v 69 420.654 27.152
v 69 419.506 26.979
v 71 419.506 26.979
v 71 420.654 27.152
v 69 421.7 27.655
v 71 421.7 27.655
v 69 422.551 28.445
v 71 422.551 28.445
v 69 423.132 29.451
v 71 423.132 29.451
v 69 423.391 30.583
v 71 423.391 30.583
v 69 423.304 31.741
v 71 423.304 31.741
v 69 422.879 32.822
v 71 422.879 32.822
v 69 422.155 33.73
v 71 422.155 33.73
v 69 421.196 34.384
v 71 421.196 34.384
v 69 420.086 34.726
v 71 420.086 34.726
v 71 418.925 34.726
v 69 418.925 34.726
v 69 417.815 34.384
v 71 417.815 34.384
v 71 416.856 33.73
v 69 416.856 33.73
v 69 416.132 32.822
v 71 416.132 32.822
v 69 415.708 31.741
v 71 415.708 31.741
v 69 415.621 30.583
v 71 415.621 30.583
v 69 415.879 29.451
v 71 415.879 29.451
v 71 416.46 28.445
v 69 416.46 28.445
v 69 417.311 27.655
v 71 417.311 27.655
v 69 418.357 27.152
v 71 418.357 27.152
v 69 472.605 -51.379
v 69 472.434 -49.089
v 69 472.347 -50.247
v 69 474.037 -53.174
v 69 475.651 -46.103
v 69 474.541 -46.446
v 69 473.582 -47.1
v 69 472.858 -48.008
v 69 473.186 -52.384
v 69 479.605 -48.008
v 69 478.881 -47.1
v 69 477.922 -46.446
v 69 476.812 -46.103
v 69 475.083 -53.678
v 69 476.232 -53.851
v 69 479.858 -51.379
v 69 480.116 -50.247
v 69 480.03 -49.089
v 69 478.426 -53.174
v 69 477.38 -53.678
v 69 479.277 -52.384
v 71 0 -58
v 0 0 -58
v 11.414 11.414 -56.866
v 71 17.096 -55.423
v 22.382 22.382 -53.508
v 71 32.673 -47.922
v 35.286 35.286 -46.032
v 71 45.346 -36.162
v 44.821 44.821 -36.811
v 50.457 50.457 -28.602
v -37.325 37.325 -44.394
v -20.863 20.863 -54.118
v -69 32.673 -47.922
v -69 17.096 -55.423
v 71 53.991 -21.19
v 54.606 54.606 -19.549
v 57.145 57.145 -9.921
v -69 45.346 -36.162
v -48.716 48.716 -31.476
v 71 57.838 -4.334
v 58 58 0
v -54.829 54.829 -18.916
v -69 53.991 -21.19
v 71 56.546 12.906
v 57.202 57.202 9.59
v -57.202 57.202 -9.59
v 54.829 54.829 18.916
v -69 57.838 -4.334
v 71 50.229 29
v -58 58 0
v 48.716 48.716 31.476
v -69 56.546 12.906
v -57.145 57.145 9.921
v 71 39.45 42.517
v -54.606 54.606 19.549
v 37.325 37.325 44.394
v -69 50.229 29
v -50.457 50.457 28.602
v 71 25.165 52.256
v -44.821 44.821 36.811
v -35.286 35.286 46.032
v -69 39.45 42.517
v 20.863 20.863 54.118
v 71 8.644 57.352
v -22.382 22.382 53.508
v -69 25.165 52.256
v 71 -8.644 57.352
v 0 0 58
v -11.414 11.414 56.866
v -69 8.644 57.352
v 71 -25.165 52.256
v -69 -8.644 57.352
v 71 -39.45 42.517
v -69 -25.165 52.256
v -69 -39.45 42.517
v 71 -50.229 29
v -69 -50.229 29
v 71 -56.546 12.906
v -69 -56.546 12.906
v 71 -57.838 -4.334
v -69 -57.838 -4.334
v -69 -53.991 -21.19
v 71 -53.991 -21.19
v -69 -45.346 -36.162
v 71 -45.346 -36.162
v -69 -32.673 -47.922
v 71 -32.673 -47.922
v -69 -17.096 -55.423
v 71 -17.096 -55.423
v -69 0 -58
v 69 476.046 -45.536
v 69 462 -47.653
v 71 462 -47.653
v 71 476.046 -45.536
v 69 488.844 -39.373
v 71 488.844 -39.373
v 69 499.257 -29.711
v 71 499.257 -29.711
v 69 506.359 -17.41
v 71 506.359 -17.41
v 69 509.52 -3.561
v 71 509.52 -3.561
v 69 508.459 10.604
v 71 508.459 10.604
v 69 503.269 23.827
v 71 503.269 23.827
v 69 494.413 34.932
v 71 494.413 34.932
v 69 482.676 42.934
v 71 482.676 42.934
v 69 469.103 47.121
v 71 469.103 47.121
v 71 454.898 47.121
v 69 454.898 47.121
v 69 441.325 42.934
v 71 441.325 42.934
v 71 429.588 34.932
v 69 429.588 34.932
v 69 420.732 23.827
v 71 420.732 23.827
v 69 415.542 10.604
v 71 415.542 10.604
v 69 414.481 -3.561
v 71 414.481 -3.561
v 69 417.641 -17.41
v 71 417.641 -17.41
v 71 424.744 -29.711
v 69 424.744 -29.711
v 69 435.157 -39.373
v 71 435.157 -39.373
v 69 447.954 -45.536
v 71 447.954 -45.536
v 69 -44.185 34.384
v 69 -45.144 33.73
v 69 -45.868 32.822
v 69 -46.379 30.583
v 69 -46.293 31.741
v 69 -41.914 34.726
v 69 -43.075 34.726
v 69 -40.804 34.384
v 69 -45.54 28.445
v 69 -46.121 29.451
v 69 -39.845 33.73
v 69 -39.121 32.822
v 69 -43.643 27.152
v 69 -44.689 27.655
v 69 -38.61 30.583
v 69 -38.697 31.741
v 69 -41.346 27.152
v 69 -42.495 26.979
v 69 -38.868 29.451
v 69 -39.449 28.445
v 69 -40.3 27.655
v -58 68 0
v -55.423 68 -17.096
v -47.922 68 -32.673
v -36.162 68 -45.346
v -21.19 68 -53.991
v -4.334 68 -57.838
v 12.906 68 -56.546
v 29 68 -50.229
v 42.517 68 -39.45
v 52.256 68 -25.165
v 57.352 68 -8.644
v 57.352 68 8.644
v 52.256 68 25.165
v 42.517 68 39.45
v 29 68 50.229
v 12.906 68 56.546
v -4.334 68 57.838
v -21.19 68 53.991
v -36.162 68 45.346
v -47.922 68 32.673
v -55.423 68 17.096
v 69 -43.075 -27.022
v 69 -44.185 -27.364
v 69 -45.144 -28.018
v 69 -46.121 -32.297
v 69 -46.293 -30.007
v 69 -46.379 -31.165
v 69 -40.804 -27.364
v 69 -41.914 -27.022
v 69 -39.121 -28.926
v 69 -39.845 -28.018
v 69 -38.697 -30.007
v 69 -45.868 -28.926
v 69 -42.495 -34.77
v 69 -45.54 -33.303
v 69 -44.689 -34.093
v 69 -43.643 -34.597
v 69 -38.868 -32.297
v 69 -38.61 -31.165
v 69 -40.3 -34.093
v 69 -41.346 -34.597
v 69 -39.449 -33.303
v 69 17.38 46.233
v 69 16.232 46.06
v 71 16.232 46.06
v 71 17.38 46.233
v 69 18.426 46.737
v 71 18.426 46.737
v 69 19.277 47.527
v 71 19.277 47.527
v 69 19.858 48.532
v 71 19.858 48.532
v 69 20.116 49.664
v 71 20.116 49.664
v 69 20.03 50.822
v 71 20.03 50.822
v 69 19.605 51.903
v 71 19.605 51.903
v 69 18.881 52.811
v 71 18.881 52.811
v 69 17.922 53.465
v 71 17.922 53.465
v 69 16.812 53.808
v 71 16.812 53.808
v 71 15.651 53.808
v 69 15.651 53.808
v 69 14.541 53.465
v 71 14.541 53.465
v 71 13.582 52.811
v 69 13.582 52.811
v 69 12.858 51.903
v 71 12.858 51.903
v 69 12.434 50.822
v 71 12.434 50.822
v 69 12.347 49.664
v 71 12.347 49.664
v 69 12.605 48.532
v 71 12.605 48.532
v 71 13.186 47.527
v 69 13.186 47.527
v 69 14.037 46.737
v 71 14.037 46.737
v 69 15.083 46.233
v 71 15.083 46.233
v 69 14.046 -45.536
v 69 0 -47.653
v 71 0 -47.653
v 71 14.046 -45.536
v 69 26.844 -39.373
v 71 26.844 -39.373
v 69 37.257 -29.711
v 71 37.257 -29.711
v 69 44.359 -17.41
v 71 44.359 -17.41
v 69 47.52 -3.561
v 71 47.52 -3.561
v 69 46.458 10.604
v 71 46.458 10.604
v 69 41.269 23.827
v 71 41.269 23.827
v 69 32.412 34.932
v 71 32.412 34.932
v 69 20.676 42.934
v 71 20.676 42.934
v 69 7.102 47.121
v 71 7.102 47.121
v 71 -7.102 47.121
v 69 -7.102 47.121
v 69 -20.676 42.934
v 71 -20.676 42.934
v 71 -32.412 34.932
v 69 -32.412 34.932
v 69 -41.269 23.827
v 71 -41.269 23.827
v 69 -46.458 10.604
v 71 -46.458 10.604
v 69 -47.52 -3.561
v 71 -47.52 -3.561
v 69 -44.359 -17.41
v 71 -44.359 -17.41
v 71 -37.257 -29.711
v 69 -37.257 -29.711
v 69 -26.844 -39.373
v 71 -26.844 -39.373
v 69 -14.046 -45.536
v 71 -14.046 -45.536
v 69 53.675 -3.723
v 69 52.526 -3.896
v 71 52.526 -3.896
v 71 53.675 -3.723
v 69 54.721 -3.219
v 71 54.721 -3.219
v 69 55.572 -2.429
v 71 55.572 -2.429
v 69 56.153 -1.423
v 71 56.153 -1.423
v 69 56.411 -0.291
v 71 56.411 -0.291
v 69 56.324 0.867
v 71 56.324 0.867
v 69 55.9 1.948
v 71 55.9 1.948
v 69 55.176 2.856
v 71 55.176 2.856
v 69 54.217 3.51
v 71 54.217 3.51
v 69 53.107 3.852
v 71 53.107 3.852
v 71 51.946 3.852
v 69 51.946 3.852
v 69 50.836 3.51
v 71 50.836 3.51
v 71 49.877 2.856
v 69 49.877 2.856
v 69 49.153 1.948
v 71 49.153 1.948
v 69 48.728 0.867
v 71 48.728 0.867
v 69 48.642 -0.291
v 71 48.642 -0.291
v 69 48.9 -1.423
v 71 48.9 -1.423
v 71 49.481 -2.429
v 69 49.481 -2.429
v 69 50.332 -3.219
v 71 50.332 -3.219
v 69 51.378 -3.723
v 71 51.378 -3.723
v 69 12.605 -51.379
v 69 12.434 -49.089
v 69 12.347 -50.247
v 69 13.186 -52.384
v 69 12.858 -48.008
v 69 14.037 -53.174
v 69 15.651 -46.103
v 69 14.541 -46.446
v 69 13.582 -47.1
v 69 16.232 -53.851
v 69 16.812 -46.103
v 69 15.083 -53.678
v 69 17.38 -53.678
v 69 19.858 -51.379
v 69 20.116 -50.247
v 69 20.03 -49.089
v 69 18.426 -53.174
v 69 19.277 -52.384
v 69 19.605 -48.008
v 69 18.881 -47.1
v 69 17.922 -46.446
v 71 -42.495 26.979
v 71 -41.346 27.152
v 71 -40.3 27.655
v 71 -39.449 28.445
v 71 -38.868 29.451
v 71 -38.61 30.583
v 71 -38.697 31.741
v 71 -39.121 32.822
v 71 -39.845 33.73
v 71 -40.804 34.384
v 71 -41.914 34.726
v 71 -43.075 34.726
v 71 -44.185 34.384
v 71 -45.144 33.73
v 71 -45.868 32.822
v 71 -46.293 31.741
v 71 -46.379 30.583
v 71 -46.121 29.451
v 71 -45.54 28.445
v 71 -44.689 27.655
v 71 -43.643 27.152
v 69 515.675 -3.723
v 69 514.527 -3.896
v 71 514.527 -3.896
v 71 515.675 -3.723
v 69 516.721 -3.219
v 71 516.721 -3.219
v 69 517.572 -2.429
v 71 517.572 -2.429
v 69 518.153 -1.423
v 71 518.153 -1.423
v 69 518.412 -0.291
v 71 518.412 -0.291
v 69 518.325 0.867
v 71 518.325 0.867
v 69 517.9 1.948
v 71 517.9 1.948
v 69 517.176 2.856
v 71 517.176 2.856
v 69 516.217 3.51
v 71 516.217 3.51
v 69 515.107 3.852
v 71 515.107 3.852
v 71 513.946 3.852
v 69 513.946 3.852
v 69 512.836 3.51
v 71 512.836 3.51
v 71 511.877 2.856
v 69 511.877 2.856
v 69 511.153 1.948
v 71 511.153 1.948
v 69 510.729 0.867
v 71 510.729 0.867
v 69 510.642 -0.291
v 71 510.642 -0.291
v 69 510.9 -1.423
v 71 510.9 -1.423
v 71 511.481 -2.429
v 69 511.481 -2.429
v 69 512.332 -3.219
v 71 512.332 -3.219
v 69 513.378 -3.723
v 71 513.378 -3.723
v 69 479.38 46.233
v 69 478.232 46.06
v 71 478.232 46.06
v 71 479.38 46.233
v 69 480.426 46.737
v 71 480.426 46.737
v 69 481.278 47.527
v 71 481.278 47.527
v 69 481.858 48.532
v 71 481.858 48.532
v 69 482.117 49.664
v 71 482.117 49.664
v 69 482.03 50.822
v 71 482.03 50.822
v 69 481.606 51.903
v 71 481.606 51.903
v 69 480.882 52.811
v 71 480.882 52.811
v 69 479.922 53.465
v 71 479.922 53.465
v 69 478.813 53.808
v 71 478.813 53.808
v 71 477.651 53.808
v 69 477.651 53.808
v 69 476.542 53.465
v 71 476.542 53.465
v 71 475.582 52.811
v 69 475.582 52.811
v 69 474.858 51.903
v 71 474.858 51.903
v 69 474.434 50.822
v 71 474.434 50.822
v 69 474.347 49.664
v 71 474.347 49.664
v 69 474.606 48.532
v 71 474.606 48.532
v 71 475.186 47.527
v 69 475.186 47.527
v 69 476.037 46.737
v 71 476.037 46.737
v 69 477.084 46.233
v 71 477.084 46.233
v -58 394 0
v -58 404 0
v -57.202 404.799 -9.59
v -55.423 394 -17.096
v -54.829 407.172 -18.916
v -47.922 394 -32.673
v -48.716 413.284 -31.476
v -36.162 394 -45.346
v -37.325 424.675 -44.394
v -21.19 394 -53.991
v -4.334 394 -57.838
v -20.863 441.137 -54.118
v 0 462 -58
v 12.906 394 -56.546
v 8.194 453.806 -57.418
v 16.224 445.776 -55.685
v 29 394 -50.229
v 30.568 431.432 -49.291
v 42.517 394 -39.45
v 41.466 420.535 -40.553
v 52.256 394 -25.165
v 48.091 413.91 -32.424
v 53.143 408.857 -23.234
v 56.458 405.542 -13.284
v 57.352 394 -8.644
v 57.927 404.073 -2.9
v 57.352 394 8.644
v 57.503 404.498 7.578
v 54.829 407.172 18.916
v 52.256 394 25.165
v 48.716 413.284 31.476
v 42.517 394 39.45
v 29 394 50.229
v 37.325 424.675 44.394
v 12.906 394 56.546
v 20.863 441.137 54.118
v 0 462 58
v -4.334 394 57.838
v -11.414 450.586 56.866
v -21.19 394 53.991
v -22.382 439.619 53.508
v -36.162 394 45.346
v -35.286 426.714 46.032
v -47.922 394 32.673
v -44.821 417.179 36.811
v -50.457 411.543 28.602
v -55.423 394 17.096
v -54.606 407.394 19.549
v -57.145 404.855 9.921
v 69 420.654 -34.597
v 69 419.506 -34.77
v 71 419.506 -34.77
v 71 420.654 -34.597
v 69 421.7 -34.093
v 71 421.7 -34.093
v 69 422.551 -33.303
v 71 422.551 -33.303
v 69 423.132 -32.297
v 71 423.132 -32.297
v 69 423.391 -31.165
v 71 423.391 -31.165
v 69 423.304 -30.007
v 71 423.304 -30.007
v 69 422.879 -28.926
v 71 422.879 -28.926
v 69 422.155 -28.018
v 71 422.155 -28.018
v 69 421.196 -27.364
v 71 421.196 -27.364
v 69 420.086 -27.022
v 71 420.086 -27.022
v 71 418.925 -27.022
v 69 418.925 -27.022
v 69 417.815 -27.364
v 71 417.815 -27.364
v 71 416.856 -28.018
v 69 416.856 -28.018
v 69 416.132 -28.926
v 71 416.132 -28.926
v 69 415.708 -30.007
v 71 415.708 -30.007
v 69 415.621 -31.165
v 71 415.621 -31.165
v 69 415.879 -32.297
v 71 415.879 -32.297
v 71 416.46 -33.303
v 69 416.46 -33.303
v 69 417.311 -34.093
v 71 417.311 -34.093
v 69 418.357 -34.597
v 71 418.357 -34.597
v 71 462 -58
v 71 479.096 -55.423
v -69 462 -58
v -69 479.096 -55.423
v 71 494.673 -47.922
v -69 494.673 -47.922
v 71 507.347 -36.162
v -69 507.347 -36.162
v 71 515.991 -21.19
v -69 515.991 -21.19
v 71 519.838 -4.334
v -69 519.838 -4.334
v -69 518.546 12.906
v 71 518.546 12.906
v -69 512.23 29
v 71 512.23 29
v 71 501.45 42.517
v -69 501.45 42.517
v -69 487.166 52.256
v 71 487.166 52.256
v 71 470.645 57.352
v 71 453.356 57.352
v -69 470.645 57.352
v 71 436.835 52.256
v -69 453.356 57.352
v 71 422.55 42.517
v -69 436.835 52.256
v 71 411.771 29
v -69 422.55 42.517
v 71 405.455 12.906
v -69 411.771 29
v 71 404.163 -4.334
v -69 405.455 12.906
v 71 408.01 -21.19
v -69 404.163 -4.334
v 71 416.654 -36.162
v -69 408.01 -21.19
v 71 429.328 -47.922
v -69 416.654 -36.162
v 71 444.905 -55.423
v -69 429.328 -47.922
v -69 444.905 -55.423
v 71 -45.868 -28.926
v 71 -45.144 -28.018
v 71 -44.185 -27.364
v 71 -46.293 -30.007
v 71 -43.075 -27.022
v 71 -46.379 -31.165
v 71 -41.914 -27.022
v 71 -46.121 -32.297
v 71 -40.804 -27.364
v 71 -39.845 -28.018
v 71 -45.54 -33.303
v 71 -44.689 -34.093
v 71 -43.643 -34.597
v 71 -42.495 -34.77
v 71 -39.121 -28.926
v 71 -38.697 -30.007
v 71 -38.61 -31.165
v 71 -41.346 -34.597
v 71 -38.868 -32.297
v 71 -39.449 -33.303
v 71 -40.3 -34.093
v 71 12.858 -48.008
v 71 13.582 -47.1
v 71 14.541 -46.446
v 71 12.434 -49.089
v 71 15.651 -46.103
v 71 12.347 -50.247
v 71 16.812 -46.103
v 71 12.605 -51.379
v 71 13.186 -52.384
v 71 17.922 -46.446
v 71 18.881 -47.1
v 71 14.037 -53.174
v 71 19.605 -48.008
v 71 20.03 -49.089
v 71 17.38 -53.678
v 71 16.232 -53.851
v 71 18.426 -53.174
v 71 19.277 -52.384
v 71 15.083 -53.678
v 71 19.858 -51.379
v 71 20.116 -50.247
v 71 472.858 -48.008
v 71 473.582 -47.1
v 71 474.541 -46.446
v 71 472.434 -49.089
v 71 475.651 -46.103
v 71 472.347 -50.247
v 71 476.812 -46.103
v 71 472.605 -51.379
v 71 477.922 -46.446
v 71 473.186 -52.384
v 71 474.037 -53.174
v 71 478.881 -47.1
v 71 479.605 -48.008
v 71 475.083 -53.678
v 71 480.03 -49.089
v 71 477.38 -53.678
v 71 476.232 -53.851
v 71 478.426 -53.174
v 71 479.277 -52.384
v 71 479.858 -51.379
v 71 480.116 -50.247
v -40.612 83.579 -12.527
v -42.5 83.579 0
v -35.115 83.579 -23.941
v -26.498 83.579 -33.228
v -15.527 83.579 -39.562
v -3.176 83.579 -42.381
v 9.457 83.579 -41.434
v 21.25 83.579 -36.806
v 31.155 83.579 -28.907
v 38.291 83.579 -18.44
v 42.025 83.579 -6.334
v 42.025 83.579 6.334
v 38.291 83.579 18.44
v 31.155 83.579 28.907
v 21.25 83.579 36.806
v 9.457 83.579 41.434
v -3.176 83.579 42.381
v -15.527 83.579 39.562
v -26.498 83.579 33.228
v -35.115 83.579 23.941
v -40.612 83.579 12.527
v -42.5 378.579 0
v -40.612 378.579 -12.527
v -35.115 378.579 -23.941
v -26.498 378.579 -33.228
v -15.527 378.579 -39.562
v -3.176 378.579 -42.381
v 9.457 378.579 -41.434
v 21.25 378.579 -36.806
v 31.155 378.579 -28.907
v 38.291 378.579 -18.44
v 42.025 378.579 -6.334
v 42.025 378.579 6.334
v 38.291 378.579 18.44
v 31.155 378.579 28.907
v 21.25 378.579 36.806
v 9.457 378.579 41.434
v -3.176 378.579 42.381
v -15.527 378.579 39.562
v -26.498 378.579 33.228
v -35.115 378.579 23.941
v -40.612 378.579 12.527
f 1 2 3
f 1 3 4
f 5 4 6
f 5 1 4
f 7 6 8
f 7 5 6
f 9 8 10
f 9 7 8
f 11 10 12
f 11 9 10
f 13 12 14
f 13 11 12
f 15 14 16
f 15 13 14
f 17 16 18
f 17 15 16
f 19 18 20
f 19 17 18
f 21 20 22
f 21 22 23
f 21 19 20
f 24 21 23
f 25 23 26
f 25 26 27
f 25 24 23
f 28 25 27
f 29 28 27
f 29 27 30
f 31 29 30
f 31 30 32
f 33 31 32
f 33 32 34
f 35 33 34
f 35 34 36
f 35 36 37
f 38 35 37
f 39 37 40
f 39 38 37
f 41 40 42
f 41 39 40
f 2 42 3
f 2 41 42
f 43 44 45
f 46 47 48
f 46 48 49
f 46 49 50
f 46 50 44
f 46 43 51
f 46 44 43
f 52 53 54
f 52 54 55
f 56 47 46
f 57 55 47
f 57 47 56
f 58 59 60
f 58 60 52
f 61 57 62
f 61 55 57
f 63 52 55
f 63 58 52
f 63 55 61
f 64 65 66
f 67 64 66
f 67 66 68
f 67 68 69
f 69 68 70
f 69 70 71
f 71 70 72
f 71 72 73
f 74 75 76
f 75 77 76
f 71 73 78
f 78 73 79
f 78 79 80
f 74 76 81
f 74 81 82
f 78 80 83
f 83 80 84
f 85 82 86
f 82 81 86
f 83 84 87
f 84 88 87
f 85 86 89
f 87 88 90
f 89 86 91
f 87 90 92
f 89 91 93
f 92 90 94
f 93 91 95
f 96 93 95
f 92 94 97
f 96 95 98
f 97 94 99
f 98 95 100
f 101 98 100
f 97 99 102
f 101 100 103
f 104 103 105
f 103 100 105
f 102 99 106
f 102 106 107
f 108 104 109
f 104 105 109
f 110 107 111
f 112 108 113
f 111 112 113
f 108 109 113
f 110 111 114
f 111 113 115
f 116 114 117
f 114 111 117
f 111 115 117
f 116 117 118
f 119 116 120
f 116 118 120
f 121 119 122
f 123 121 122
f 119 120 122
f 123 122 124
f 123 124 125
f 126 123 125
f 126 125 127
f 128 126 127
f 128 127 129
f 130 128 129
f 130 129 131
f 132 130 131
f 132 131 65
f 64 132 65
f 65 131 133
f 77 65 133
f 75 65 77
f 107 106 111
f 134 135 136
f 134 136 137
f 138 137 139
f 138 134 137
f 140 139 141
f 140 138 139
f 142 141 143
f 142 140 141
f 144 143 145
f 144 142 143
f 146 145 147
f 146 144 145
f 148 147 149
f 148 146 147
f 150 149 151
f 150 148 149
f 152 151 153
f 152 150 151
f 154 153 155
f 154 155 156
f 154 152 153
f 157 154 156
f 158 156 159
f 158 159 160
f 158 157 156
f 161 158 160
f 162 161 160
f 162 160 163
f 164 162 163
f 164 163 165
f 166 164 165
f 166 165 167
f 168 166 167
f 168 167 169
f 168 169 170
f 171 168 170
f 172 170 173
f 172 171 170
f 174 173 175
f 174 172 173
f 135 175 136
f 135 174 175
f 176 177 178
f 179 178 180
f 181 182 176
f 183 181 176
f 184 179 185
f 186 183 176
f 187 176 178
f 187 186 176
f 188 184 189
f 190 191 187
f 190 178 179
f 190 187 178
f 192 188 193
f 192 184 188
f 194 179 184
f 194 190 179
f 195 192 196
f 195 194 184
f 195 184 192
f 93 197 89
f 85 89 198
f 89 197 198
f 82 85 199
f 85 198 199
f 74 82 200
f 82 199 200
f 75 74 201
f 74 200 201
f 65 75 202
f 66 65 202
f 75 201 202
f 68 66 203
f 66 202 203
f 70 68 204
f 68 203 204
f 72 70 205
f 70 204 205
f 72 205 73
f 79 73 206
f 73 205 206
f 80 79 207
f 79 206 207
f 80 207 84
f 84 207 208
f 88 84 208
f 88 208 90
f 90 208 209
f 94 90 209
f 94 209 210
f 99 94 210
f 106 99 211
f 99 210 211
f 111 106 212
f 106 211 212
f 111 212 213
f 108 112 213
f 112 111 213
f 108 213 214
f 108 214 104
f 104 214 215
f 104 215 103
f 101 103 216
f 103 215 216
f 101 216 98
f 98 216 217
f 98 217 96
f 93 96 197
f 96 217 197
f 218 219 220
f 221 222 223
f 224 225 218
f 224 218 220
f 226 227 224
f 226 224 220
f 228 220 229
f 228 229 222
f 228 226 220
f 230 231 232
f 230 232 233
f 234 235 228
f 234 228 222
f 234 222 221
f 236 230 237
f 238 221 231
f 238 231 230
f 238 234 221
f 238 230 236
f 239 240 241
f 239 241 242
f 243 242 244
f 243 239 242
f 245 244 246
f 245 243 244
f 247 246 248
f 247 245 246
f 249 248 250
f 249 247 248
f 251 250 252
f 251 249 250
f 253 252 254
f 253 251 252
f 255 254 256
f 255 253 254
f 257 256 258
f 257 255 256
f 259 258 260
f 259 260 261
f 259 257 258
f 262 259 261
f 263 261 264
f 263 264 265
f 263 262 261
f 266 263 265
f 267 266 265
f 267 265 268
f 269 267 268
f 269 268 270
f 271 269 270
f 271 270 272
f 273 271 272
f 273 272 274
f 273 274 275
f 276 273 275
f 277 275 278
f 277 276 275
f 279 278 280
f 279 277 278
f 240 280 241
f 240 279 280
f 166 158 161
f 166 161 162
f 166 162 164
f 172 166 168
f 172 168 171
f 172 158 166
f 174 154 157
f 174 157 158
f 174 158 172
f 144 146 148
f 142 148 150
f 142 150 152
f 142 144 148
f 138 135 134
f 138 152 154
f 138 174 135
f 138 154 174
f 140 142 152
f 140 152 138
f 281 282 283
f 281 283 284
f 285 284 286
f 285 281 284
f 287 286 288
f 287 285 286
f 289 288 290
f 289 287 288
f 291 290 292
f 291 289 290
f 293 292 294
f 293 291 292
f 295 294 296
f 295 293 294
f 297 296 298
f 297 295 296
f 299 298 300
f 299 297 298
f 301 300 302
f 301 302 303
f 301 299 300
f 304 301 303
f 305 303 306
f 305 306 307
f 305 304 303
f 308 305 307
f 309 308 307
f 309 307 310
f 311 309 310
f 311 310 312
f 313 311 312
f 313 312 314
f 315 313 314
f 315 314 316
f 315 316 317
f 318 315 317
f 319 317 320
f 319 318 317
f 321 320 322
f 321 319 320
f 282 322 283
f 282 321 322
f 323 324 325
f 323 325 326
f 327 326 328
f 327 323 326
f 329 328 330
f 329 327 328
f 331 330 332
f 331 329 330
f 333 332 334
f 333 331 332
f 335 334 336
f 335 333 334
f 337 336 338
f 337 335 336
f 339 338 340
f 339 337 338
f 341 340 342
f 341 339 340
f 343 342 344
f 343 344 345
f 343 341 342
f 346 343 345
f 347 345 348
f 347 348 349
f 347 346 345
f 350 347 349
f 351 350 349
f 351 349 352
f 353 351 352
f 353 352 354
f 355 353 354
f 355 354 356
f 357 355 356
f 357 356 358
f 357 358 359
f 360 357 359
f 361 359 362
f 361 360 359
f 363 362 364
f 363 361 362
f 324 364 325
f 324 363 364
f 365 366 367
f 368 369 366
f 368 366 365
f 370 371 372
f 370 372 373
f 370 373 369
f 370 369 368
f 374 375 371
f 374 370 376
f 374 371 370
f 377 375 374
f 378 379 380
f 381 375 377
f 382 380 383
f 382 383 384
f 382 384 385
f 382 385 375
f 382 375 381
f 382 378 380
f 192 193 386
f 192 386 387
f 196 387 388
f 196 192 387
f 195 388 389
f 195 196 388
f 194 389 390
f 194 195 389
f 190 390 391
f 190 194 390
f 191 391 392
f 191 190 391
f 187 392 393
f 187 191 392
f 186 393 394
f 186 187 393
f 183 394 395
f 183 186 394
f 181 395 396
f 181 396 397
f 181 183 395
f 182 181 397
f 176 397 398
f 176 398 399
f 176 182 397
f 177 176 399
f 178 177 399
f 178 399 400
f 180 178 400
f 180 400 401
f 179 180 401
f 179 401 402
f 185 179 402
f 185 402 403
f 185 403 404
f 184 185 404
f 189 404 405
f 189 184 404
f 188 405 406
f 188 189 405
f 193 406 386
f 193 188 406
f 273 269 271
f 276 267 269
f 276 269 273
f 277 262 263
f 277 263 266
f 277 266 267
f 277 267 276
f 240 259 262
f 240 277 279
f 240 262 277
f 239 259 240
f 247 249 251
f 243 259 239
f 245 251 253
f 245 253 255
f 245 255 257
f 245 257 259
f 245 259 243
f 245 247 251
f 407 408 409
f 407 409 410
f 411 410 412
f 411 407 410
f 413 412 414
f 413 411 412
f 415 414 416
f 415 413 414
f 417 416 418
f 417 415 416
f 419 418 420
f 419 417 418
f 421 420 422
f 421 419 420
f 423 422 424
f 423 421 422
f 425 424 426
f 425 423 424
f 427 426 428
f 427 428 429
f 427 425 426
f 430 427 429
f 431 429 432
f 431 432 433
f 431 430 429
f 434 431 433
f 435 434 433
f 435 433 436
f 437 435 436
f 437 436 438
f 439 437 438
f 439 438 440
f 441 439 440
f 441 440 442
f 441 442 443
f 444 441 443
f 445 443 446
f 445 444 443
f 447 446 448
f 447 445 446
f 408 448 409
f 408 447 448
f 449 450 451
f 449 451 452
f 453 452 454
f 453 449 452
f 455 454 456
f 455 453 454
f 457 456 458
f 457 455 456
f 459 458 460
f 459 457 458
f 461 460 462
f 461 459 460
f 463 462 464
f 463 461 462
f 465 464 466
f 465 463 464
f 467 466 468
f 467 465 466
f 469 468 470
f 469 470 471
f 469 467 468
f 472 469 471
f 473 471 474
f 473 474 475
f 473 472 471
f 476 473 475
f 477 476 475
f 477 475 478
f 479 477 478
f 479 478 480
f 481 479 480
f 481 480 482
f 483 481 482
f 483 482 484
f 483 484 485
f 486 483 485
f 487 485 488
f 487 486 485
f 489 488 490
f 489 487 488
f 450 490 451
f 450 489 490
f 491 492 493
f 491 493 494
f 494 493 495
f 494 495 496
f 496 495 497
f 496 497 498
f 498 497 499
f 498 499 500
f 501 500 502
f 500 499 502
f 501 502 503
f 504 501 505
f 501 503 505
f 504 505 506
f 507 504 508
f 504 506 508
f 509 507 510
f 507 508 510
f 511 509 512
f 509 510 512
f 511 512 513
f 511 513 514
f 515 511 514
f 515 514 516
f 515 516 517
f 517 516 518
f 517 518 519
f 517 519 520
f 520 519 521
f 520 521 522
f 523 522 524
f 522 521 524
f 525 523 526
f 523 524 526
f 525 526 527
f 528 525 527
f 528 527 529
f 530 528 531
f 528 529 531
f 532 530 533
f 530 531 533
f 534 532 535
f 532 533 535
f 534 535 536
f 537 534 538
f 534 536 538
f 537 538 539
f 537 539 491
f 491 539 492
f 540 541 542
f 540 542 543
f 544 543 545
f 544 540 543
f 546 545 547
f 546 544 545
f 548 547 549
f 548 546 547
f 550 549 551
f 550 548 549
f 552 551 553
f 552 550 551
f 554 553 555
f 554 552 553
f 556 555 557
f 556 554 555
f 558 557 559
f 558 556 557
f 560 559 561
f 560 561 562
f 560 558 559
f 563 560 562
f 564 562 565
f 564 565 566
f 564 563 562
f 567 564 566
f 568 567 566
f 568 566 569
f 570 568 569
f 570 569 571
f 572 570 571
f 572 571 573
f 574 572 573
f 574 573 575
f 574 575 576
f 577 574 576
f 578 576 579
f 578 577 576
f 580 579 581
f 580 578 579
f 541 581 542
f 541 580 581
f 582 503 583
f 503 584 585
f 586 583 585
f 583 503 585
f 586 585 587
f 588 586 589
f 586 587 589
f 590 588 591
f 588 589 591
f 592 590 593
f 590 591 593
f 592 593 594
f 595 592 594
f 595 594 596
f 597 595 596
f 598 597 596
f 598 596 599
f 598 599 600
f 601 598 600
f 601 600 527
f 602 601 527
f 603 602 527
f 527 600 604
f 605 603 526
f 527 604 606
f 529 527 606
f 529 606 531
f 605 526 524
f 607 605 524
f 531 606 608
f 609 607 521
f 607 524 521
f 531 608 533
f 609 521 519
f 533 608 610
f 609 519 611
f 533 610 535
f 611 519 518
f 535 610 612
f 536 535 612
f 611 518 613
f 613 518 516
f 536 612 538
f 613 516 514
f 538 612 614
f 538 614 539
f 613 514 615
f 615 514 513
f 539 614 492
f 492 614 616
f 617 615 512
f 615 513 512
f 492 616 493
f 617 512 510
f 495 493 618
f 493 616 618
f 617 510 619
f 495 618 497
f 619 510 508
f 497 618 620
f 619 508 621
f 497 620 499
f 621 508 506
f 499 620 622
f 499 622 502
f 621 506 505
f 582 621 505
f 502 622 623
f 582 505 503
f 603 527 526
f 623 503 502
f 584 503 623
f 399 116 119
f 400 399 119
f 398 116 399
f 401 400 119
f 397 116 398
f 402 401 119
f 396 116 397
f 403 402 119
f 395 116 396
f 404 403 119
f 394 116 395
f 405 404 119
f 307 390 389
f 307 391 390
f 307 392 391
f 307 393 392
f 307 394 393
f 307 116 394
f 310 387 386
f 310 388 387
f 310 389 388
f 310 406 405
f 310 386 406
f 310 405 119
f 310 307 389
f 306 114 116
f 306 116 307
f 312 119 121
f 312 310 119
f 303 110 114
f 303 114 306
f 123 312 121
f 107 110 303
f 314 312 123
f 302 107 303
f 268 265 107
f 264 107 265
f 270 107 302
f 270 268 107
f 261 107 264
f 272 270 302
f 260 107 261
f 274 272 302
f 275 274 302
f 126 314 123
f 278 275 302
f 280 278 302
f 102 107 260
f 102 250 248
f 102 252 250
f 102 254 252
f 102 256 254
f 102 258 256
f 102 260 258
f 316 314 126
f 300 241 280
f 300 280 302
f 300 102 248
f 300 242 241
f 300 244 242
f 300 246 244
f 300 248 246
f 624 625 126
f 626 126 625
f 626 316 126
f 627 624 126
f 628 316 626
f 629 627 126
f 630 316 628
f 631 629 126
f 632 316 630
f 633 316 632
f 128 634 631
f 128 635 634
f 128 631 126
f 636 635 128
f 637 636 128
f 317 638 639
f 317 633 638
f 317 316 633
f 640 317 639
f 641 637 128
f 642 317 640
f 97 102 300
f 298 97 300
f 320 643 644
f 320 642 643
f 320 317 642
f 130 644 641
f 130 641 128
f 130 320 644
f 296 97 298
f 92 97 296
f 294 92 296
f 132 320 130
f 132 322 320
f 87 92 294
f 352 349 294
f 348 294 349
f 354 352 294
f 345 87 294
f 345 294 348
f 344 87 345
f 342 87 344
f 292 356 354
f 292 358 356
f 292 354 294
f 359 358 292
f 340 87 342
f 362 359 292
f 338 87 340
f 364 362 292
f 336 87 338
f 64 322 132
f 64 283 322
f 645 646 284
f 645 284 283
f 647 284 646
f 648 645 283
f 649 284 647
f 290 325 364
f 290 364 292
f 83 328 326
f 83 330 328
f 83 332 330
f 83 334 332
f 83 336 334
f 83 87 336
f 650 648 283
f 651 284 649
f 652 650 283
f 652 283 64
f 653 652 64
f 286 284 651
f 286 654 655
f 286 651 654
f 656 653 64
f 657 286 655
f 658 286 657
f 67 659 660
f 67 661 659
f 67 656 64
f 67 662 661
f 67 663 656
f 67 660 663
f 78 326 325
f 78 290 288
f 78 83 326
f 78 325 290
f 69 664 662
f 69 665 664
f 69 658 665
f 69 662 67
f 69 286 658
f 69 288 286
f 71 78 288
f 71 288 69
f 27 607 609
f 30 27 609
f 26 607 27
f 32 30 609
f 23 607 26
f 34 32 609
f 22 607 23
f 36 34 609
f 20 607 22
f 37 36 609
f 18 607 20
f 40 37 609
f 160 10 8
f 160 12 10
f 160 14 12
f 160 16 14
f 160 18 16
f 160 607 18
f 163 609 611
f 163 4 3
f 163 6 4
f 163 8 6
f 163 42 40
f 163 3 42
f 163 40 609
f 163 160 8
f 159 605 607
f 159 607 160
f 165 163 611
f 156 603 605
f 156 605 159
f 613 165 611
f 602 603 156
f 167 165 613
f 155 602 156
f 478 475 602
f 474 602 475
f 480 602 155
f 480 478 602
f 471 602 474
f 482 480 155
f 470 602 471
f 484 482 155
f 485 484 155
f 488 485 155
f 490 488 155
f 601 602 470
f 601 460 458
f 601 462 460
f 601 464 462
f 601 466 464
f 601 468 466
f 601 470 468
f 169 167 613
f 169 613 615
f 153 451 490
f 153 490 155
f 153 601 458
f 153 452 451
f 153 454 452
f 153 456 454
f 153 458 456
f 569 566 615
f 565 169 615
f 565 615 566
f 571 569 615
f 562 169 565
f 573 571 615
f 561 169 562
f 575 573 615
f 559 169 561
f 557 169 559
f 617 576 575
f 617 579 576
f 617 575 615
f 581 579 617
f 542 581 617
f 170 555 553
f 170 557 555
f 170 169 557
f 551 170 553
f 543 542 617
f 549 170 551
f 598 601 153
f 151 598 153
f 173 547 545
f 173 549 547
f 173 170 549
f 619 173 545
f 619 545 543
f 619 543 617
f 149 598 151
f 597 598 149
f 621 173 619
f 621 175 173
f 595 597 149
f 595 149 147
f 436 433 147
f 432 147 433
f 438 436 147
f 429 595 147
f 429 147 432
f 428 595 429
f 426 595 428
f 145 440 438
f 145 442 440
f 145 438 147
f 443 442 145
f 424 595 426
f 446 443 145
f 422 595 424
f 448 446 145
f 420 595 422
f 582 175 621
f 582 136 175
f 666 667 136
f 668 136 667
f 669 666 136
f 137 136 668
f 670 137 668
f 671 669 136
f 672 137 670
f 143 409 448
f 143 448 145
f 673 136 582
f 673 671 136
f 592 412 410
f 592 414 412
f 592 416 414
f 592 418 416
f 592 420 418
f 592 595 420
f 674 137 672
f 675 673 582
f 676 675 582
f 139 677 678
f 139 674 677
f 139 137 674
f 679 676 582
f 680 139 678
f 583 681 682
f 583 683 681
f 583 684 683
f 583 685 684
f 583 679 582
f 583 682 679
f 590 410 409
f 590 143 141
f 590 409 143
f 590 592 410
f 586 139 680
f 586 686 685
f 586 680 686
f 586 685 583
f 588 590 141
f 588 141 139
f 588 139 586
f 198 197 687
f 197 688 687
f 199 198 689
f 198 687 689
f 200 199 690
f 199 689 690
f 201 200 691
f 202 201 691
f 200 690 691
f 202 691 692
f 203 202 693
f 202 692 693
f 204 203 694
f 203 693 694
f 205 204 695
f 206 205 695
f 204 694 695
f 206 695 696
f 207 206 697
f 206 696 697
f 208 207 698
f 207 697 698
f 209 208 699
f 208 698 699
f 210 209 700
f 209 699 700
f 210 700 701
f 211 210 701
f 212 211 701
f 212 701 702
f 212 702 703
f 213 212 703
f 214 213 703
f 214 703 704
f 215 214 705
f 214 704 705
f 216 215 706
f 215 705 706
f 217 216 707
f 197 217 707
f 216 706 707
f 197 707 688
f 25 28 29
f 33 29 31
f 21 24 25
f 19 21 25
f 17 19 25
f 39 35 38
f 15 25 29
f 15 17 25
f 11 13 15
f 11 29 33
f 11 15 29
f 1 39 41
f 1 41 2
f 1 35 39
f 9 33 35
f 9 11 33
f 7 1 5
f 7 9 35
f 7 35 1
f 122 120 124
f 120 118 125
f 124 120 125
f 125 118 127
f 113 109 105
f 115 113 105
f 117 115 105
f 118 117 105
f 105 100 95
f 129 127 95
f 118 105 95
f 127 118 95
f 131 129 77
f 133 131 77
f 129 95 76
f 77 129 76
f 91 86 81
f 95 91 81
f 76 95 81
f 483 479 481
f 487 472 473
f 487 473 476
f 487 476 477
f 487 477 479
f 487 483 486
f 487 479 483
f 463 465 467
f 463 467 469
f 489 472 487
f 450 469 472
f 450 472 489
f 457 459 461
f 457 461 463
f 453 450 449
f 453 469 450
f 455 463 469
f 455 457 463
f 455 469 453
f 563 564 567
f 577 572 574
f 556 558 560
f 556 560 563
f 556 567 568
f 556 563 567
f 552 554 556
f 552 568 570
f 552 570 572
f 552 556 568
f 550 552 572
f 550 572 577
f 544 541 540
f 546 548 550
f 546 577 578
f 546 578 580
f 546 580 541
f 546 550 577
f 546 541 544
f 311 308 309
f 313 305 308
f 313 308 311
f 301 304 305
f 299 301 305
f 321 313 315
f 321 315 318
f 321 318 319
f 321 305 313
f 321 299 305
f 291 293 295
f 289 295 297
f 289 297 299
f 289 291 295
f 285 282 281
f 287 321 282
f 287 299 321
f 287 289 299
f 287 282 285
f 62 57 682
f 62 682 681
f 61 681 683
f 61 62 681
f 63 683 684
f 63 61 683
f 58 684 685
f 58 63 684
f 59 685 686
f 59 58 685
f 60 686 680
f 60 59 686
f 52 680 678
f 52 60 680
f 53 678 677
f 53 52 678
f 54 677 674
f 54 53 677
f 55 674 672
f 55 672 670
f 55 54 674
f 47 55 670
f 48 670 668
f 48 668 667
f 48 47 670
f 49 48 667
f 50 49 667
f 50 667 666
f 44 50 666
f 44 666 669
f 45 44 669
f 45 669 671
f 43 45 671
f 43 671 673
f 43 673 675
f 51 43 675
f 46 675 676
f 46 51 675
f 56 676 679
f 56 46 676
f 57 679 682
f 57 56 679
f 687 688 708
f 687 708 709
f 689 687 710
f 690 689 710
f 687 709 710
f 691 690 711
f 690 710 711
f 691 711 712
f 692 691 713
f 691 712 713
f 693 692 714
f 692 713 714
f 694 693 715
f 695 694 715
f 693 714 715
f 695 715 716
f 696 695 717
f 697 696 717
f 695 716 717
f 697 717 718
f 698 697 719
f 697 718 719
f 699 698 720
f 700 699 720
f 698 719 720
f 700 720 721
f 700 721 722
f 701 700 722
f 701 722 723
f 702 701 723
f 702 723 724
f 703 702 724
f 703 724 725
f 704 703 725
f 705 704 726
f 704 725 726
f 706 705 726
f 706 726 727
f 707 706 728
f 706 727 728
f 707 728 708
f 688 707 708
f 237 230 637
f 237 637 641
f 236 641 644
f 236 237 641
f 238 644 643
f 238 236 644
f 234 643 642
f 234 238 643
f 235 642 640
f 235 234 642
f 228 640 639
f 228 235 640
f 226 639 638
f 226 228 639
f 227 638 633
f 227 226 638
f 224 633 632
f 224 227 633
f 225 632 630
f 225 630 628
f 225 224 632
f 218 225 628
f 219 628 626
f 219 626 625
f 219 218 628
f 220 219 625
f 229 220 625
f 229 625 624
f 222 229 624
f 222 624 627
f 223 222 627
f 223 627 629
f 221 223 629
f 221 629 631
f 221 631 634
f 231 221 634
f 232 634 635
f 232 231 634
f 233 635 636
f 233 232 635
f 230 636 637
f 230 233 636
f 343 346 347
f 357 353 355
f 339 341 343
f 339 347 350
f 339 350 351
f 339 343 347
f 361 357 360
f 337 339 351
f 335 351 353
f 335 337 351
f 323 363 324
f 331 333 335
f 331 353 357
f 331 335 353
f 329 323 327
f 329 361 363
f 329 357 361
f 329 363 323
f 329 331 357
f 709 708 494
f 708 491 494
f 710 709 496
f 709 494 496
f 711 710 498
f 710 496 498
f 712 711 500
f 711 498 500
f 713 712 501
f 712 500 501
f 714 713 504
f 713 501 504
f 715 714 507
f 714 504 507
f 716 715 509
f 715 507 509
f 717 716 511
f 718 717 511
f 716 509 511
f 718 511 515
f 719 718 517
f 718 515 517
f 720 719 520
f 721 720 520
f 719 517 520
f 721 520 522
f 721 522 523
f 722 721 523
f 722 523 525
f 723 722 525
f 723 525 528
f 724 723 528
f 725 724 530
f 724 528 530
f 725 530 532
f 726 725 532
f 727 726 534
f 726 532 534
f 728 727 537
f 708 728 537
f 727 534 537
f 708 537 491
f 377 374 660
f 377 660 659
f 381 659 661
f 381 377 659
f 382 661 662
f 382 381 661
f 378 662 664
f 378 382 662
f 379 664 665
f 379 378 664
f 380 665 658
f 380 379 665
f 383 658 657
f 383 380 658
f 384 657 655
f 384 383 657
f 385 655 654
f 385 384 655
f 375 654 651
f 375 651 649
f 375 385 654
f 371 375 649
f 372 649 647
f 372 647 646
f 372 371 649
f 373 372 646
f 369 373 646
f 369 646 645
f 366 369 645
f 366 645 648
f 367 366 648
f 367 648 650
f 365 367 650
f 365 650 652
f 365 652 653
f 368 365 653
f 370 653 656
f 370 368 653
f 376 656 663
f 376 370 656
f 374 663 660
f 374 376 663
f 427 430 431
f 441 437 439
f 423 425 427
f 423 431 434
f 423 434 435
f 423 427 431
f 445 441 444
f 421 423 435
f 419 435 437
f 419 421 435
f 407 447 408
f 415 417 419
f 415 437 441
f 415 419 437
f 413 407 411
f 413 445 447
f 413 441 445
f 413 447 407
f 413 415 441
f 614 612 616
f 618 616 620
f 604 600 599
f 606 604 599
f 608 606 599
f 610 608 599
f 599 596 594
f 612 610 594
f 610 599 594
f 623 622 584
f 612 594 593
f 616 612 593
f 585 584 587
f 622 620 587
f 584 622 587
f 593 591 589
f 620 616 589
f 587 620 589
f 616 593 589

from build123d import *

# Parameters (mm, degrees)
SALIENTE_EXTRUIR2_DEPTH      = 69
SALIENTE_EXTRUIR2_DEPTH_BACK = 69
CROQUIS3_R                   = 58
CROQUIS5_R                   = 58
CROQUIS5_R_2                 = 47.65301306
CROQUIS5_R_3                 = 3.895689101
SALIENTE_EXTRUIR3_DEPTH      = 2


with BuildPart() as part:
    # Croquis2 → Revolución1 (revolve)
    with BuildSketch(Plane.XY):
        Polygon((0, 0), (-58, 0), (-58, 68), (-42.5, 83.579391827), (-42.5, 378.579391827), (-58, 394.000404577), (-58, 462.000404577), (0, 462.000404577), align=None)
    revolve(axis=Axis((0, 462.000404577, 0), (0, -1, 0)))

    # Croquis3 → Saliente-Extruir2 (add, two sides: drawn at the far end of the back side and taken through both)
    with BuildSketch(Plane(origin=(0, 0, 0), x_dir=(0, 0, -1), z_dir=(1, 0, 0)).offset(-SALIENTE_EXTRUIR2_DEPTH_BACK)):
        with Locations((0, 462.000404577)):
            Circle(CROQUIS3_R)
        Circle(CROQUIS3_R)
    extrude(amount=SALIENTE_EXTRUIR2_DEPTH + SALIENTE_EXTRUIR2_DEPTH_BACK)

    # Croquis5 → Saliente-Extruir3 (add)
    # profile 1 of 2: a face of its own
    with BuildSketch(Plane(origin=(69, 0, 0), x_dir=(0, 0, -1), z_dir=(1, 0, 0))):
        Circle(CROQUIS5_R)
        Circle(CROQUIS5_R_2, mode=Mode.SUBTRACT)
        with Locations((0, 52.526315759)):
            Circle(CROQUIS5_R_3, mode=Mode.SUBTRACT)
        with Locations((49.95549488, 16.231524222)):
            Circle(CROQUIS5_R_3, mode=Mode.SUBTRACT)
        with Locations((30.874193761, -42.494682101)):
            Circle(CROQUIS5_R_3, mode=Mode.SUBTRACT)
        with Locations((-30.874193761, -42.494682101)):
            Circle(CROQUIS5_R_3, mode=Mode.SUBTRACT)
        with Locations((-49.95549488, 16.231524222)):
            Circle(CROQUIS5_R_3, mode=Mode.SUBTRACT)
    # profile 2 of 2: a face of its own
    with BuildSketch(Plane(origin=(69, 0, 0), x_dir=(0, 0, -1), z_dir=(1, 0, 0))):
        with Locations((0, 462.000404577)):
            Circle(CROQUIS5_R)
        with Locations((0, 462.000404577)):
            Circle(CROQUIS5_R_2, mode=Mode.SUBTRACT)
        with Locations((-49.95549488, 478.231928798)):
            Circle(CROQUIS5_R_3, mode=Mode.SUBTRACT)
        with Locations((0, 514.526720336)):
            Circle(CROQUIS5_R_3, mode=Mode.SUBTRACT)
        with Locations((30.874193761, 419.505722476)):
            Circle(CROQUIS5_R_3, mode=Mode.SUBTRACT)
        with Locations((-30.874193761, 419.505722476)):
            Circle(CROQUIS5_R_3, mode=Mode.SUBTRACT)
        with Locations((49.95549488, 476.231524222)):
            Circle(CROQUIS5_R_3, mode=Mode.SUBTRACT)
    extrude(amount=SALIENTE_EXTRUIR3_DEPTH)


solid = part.part
